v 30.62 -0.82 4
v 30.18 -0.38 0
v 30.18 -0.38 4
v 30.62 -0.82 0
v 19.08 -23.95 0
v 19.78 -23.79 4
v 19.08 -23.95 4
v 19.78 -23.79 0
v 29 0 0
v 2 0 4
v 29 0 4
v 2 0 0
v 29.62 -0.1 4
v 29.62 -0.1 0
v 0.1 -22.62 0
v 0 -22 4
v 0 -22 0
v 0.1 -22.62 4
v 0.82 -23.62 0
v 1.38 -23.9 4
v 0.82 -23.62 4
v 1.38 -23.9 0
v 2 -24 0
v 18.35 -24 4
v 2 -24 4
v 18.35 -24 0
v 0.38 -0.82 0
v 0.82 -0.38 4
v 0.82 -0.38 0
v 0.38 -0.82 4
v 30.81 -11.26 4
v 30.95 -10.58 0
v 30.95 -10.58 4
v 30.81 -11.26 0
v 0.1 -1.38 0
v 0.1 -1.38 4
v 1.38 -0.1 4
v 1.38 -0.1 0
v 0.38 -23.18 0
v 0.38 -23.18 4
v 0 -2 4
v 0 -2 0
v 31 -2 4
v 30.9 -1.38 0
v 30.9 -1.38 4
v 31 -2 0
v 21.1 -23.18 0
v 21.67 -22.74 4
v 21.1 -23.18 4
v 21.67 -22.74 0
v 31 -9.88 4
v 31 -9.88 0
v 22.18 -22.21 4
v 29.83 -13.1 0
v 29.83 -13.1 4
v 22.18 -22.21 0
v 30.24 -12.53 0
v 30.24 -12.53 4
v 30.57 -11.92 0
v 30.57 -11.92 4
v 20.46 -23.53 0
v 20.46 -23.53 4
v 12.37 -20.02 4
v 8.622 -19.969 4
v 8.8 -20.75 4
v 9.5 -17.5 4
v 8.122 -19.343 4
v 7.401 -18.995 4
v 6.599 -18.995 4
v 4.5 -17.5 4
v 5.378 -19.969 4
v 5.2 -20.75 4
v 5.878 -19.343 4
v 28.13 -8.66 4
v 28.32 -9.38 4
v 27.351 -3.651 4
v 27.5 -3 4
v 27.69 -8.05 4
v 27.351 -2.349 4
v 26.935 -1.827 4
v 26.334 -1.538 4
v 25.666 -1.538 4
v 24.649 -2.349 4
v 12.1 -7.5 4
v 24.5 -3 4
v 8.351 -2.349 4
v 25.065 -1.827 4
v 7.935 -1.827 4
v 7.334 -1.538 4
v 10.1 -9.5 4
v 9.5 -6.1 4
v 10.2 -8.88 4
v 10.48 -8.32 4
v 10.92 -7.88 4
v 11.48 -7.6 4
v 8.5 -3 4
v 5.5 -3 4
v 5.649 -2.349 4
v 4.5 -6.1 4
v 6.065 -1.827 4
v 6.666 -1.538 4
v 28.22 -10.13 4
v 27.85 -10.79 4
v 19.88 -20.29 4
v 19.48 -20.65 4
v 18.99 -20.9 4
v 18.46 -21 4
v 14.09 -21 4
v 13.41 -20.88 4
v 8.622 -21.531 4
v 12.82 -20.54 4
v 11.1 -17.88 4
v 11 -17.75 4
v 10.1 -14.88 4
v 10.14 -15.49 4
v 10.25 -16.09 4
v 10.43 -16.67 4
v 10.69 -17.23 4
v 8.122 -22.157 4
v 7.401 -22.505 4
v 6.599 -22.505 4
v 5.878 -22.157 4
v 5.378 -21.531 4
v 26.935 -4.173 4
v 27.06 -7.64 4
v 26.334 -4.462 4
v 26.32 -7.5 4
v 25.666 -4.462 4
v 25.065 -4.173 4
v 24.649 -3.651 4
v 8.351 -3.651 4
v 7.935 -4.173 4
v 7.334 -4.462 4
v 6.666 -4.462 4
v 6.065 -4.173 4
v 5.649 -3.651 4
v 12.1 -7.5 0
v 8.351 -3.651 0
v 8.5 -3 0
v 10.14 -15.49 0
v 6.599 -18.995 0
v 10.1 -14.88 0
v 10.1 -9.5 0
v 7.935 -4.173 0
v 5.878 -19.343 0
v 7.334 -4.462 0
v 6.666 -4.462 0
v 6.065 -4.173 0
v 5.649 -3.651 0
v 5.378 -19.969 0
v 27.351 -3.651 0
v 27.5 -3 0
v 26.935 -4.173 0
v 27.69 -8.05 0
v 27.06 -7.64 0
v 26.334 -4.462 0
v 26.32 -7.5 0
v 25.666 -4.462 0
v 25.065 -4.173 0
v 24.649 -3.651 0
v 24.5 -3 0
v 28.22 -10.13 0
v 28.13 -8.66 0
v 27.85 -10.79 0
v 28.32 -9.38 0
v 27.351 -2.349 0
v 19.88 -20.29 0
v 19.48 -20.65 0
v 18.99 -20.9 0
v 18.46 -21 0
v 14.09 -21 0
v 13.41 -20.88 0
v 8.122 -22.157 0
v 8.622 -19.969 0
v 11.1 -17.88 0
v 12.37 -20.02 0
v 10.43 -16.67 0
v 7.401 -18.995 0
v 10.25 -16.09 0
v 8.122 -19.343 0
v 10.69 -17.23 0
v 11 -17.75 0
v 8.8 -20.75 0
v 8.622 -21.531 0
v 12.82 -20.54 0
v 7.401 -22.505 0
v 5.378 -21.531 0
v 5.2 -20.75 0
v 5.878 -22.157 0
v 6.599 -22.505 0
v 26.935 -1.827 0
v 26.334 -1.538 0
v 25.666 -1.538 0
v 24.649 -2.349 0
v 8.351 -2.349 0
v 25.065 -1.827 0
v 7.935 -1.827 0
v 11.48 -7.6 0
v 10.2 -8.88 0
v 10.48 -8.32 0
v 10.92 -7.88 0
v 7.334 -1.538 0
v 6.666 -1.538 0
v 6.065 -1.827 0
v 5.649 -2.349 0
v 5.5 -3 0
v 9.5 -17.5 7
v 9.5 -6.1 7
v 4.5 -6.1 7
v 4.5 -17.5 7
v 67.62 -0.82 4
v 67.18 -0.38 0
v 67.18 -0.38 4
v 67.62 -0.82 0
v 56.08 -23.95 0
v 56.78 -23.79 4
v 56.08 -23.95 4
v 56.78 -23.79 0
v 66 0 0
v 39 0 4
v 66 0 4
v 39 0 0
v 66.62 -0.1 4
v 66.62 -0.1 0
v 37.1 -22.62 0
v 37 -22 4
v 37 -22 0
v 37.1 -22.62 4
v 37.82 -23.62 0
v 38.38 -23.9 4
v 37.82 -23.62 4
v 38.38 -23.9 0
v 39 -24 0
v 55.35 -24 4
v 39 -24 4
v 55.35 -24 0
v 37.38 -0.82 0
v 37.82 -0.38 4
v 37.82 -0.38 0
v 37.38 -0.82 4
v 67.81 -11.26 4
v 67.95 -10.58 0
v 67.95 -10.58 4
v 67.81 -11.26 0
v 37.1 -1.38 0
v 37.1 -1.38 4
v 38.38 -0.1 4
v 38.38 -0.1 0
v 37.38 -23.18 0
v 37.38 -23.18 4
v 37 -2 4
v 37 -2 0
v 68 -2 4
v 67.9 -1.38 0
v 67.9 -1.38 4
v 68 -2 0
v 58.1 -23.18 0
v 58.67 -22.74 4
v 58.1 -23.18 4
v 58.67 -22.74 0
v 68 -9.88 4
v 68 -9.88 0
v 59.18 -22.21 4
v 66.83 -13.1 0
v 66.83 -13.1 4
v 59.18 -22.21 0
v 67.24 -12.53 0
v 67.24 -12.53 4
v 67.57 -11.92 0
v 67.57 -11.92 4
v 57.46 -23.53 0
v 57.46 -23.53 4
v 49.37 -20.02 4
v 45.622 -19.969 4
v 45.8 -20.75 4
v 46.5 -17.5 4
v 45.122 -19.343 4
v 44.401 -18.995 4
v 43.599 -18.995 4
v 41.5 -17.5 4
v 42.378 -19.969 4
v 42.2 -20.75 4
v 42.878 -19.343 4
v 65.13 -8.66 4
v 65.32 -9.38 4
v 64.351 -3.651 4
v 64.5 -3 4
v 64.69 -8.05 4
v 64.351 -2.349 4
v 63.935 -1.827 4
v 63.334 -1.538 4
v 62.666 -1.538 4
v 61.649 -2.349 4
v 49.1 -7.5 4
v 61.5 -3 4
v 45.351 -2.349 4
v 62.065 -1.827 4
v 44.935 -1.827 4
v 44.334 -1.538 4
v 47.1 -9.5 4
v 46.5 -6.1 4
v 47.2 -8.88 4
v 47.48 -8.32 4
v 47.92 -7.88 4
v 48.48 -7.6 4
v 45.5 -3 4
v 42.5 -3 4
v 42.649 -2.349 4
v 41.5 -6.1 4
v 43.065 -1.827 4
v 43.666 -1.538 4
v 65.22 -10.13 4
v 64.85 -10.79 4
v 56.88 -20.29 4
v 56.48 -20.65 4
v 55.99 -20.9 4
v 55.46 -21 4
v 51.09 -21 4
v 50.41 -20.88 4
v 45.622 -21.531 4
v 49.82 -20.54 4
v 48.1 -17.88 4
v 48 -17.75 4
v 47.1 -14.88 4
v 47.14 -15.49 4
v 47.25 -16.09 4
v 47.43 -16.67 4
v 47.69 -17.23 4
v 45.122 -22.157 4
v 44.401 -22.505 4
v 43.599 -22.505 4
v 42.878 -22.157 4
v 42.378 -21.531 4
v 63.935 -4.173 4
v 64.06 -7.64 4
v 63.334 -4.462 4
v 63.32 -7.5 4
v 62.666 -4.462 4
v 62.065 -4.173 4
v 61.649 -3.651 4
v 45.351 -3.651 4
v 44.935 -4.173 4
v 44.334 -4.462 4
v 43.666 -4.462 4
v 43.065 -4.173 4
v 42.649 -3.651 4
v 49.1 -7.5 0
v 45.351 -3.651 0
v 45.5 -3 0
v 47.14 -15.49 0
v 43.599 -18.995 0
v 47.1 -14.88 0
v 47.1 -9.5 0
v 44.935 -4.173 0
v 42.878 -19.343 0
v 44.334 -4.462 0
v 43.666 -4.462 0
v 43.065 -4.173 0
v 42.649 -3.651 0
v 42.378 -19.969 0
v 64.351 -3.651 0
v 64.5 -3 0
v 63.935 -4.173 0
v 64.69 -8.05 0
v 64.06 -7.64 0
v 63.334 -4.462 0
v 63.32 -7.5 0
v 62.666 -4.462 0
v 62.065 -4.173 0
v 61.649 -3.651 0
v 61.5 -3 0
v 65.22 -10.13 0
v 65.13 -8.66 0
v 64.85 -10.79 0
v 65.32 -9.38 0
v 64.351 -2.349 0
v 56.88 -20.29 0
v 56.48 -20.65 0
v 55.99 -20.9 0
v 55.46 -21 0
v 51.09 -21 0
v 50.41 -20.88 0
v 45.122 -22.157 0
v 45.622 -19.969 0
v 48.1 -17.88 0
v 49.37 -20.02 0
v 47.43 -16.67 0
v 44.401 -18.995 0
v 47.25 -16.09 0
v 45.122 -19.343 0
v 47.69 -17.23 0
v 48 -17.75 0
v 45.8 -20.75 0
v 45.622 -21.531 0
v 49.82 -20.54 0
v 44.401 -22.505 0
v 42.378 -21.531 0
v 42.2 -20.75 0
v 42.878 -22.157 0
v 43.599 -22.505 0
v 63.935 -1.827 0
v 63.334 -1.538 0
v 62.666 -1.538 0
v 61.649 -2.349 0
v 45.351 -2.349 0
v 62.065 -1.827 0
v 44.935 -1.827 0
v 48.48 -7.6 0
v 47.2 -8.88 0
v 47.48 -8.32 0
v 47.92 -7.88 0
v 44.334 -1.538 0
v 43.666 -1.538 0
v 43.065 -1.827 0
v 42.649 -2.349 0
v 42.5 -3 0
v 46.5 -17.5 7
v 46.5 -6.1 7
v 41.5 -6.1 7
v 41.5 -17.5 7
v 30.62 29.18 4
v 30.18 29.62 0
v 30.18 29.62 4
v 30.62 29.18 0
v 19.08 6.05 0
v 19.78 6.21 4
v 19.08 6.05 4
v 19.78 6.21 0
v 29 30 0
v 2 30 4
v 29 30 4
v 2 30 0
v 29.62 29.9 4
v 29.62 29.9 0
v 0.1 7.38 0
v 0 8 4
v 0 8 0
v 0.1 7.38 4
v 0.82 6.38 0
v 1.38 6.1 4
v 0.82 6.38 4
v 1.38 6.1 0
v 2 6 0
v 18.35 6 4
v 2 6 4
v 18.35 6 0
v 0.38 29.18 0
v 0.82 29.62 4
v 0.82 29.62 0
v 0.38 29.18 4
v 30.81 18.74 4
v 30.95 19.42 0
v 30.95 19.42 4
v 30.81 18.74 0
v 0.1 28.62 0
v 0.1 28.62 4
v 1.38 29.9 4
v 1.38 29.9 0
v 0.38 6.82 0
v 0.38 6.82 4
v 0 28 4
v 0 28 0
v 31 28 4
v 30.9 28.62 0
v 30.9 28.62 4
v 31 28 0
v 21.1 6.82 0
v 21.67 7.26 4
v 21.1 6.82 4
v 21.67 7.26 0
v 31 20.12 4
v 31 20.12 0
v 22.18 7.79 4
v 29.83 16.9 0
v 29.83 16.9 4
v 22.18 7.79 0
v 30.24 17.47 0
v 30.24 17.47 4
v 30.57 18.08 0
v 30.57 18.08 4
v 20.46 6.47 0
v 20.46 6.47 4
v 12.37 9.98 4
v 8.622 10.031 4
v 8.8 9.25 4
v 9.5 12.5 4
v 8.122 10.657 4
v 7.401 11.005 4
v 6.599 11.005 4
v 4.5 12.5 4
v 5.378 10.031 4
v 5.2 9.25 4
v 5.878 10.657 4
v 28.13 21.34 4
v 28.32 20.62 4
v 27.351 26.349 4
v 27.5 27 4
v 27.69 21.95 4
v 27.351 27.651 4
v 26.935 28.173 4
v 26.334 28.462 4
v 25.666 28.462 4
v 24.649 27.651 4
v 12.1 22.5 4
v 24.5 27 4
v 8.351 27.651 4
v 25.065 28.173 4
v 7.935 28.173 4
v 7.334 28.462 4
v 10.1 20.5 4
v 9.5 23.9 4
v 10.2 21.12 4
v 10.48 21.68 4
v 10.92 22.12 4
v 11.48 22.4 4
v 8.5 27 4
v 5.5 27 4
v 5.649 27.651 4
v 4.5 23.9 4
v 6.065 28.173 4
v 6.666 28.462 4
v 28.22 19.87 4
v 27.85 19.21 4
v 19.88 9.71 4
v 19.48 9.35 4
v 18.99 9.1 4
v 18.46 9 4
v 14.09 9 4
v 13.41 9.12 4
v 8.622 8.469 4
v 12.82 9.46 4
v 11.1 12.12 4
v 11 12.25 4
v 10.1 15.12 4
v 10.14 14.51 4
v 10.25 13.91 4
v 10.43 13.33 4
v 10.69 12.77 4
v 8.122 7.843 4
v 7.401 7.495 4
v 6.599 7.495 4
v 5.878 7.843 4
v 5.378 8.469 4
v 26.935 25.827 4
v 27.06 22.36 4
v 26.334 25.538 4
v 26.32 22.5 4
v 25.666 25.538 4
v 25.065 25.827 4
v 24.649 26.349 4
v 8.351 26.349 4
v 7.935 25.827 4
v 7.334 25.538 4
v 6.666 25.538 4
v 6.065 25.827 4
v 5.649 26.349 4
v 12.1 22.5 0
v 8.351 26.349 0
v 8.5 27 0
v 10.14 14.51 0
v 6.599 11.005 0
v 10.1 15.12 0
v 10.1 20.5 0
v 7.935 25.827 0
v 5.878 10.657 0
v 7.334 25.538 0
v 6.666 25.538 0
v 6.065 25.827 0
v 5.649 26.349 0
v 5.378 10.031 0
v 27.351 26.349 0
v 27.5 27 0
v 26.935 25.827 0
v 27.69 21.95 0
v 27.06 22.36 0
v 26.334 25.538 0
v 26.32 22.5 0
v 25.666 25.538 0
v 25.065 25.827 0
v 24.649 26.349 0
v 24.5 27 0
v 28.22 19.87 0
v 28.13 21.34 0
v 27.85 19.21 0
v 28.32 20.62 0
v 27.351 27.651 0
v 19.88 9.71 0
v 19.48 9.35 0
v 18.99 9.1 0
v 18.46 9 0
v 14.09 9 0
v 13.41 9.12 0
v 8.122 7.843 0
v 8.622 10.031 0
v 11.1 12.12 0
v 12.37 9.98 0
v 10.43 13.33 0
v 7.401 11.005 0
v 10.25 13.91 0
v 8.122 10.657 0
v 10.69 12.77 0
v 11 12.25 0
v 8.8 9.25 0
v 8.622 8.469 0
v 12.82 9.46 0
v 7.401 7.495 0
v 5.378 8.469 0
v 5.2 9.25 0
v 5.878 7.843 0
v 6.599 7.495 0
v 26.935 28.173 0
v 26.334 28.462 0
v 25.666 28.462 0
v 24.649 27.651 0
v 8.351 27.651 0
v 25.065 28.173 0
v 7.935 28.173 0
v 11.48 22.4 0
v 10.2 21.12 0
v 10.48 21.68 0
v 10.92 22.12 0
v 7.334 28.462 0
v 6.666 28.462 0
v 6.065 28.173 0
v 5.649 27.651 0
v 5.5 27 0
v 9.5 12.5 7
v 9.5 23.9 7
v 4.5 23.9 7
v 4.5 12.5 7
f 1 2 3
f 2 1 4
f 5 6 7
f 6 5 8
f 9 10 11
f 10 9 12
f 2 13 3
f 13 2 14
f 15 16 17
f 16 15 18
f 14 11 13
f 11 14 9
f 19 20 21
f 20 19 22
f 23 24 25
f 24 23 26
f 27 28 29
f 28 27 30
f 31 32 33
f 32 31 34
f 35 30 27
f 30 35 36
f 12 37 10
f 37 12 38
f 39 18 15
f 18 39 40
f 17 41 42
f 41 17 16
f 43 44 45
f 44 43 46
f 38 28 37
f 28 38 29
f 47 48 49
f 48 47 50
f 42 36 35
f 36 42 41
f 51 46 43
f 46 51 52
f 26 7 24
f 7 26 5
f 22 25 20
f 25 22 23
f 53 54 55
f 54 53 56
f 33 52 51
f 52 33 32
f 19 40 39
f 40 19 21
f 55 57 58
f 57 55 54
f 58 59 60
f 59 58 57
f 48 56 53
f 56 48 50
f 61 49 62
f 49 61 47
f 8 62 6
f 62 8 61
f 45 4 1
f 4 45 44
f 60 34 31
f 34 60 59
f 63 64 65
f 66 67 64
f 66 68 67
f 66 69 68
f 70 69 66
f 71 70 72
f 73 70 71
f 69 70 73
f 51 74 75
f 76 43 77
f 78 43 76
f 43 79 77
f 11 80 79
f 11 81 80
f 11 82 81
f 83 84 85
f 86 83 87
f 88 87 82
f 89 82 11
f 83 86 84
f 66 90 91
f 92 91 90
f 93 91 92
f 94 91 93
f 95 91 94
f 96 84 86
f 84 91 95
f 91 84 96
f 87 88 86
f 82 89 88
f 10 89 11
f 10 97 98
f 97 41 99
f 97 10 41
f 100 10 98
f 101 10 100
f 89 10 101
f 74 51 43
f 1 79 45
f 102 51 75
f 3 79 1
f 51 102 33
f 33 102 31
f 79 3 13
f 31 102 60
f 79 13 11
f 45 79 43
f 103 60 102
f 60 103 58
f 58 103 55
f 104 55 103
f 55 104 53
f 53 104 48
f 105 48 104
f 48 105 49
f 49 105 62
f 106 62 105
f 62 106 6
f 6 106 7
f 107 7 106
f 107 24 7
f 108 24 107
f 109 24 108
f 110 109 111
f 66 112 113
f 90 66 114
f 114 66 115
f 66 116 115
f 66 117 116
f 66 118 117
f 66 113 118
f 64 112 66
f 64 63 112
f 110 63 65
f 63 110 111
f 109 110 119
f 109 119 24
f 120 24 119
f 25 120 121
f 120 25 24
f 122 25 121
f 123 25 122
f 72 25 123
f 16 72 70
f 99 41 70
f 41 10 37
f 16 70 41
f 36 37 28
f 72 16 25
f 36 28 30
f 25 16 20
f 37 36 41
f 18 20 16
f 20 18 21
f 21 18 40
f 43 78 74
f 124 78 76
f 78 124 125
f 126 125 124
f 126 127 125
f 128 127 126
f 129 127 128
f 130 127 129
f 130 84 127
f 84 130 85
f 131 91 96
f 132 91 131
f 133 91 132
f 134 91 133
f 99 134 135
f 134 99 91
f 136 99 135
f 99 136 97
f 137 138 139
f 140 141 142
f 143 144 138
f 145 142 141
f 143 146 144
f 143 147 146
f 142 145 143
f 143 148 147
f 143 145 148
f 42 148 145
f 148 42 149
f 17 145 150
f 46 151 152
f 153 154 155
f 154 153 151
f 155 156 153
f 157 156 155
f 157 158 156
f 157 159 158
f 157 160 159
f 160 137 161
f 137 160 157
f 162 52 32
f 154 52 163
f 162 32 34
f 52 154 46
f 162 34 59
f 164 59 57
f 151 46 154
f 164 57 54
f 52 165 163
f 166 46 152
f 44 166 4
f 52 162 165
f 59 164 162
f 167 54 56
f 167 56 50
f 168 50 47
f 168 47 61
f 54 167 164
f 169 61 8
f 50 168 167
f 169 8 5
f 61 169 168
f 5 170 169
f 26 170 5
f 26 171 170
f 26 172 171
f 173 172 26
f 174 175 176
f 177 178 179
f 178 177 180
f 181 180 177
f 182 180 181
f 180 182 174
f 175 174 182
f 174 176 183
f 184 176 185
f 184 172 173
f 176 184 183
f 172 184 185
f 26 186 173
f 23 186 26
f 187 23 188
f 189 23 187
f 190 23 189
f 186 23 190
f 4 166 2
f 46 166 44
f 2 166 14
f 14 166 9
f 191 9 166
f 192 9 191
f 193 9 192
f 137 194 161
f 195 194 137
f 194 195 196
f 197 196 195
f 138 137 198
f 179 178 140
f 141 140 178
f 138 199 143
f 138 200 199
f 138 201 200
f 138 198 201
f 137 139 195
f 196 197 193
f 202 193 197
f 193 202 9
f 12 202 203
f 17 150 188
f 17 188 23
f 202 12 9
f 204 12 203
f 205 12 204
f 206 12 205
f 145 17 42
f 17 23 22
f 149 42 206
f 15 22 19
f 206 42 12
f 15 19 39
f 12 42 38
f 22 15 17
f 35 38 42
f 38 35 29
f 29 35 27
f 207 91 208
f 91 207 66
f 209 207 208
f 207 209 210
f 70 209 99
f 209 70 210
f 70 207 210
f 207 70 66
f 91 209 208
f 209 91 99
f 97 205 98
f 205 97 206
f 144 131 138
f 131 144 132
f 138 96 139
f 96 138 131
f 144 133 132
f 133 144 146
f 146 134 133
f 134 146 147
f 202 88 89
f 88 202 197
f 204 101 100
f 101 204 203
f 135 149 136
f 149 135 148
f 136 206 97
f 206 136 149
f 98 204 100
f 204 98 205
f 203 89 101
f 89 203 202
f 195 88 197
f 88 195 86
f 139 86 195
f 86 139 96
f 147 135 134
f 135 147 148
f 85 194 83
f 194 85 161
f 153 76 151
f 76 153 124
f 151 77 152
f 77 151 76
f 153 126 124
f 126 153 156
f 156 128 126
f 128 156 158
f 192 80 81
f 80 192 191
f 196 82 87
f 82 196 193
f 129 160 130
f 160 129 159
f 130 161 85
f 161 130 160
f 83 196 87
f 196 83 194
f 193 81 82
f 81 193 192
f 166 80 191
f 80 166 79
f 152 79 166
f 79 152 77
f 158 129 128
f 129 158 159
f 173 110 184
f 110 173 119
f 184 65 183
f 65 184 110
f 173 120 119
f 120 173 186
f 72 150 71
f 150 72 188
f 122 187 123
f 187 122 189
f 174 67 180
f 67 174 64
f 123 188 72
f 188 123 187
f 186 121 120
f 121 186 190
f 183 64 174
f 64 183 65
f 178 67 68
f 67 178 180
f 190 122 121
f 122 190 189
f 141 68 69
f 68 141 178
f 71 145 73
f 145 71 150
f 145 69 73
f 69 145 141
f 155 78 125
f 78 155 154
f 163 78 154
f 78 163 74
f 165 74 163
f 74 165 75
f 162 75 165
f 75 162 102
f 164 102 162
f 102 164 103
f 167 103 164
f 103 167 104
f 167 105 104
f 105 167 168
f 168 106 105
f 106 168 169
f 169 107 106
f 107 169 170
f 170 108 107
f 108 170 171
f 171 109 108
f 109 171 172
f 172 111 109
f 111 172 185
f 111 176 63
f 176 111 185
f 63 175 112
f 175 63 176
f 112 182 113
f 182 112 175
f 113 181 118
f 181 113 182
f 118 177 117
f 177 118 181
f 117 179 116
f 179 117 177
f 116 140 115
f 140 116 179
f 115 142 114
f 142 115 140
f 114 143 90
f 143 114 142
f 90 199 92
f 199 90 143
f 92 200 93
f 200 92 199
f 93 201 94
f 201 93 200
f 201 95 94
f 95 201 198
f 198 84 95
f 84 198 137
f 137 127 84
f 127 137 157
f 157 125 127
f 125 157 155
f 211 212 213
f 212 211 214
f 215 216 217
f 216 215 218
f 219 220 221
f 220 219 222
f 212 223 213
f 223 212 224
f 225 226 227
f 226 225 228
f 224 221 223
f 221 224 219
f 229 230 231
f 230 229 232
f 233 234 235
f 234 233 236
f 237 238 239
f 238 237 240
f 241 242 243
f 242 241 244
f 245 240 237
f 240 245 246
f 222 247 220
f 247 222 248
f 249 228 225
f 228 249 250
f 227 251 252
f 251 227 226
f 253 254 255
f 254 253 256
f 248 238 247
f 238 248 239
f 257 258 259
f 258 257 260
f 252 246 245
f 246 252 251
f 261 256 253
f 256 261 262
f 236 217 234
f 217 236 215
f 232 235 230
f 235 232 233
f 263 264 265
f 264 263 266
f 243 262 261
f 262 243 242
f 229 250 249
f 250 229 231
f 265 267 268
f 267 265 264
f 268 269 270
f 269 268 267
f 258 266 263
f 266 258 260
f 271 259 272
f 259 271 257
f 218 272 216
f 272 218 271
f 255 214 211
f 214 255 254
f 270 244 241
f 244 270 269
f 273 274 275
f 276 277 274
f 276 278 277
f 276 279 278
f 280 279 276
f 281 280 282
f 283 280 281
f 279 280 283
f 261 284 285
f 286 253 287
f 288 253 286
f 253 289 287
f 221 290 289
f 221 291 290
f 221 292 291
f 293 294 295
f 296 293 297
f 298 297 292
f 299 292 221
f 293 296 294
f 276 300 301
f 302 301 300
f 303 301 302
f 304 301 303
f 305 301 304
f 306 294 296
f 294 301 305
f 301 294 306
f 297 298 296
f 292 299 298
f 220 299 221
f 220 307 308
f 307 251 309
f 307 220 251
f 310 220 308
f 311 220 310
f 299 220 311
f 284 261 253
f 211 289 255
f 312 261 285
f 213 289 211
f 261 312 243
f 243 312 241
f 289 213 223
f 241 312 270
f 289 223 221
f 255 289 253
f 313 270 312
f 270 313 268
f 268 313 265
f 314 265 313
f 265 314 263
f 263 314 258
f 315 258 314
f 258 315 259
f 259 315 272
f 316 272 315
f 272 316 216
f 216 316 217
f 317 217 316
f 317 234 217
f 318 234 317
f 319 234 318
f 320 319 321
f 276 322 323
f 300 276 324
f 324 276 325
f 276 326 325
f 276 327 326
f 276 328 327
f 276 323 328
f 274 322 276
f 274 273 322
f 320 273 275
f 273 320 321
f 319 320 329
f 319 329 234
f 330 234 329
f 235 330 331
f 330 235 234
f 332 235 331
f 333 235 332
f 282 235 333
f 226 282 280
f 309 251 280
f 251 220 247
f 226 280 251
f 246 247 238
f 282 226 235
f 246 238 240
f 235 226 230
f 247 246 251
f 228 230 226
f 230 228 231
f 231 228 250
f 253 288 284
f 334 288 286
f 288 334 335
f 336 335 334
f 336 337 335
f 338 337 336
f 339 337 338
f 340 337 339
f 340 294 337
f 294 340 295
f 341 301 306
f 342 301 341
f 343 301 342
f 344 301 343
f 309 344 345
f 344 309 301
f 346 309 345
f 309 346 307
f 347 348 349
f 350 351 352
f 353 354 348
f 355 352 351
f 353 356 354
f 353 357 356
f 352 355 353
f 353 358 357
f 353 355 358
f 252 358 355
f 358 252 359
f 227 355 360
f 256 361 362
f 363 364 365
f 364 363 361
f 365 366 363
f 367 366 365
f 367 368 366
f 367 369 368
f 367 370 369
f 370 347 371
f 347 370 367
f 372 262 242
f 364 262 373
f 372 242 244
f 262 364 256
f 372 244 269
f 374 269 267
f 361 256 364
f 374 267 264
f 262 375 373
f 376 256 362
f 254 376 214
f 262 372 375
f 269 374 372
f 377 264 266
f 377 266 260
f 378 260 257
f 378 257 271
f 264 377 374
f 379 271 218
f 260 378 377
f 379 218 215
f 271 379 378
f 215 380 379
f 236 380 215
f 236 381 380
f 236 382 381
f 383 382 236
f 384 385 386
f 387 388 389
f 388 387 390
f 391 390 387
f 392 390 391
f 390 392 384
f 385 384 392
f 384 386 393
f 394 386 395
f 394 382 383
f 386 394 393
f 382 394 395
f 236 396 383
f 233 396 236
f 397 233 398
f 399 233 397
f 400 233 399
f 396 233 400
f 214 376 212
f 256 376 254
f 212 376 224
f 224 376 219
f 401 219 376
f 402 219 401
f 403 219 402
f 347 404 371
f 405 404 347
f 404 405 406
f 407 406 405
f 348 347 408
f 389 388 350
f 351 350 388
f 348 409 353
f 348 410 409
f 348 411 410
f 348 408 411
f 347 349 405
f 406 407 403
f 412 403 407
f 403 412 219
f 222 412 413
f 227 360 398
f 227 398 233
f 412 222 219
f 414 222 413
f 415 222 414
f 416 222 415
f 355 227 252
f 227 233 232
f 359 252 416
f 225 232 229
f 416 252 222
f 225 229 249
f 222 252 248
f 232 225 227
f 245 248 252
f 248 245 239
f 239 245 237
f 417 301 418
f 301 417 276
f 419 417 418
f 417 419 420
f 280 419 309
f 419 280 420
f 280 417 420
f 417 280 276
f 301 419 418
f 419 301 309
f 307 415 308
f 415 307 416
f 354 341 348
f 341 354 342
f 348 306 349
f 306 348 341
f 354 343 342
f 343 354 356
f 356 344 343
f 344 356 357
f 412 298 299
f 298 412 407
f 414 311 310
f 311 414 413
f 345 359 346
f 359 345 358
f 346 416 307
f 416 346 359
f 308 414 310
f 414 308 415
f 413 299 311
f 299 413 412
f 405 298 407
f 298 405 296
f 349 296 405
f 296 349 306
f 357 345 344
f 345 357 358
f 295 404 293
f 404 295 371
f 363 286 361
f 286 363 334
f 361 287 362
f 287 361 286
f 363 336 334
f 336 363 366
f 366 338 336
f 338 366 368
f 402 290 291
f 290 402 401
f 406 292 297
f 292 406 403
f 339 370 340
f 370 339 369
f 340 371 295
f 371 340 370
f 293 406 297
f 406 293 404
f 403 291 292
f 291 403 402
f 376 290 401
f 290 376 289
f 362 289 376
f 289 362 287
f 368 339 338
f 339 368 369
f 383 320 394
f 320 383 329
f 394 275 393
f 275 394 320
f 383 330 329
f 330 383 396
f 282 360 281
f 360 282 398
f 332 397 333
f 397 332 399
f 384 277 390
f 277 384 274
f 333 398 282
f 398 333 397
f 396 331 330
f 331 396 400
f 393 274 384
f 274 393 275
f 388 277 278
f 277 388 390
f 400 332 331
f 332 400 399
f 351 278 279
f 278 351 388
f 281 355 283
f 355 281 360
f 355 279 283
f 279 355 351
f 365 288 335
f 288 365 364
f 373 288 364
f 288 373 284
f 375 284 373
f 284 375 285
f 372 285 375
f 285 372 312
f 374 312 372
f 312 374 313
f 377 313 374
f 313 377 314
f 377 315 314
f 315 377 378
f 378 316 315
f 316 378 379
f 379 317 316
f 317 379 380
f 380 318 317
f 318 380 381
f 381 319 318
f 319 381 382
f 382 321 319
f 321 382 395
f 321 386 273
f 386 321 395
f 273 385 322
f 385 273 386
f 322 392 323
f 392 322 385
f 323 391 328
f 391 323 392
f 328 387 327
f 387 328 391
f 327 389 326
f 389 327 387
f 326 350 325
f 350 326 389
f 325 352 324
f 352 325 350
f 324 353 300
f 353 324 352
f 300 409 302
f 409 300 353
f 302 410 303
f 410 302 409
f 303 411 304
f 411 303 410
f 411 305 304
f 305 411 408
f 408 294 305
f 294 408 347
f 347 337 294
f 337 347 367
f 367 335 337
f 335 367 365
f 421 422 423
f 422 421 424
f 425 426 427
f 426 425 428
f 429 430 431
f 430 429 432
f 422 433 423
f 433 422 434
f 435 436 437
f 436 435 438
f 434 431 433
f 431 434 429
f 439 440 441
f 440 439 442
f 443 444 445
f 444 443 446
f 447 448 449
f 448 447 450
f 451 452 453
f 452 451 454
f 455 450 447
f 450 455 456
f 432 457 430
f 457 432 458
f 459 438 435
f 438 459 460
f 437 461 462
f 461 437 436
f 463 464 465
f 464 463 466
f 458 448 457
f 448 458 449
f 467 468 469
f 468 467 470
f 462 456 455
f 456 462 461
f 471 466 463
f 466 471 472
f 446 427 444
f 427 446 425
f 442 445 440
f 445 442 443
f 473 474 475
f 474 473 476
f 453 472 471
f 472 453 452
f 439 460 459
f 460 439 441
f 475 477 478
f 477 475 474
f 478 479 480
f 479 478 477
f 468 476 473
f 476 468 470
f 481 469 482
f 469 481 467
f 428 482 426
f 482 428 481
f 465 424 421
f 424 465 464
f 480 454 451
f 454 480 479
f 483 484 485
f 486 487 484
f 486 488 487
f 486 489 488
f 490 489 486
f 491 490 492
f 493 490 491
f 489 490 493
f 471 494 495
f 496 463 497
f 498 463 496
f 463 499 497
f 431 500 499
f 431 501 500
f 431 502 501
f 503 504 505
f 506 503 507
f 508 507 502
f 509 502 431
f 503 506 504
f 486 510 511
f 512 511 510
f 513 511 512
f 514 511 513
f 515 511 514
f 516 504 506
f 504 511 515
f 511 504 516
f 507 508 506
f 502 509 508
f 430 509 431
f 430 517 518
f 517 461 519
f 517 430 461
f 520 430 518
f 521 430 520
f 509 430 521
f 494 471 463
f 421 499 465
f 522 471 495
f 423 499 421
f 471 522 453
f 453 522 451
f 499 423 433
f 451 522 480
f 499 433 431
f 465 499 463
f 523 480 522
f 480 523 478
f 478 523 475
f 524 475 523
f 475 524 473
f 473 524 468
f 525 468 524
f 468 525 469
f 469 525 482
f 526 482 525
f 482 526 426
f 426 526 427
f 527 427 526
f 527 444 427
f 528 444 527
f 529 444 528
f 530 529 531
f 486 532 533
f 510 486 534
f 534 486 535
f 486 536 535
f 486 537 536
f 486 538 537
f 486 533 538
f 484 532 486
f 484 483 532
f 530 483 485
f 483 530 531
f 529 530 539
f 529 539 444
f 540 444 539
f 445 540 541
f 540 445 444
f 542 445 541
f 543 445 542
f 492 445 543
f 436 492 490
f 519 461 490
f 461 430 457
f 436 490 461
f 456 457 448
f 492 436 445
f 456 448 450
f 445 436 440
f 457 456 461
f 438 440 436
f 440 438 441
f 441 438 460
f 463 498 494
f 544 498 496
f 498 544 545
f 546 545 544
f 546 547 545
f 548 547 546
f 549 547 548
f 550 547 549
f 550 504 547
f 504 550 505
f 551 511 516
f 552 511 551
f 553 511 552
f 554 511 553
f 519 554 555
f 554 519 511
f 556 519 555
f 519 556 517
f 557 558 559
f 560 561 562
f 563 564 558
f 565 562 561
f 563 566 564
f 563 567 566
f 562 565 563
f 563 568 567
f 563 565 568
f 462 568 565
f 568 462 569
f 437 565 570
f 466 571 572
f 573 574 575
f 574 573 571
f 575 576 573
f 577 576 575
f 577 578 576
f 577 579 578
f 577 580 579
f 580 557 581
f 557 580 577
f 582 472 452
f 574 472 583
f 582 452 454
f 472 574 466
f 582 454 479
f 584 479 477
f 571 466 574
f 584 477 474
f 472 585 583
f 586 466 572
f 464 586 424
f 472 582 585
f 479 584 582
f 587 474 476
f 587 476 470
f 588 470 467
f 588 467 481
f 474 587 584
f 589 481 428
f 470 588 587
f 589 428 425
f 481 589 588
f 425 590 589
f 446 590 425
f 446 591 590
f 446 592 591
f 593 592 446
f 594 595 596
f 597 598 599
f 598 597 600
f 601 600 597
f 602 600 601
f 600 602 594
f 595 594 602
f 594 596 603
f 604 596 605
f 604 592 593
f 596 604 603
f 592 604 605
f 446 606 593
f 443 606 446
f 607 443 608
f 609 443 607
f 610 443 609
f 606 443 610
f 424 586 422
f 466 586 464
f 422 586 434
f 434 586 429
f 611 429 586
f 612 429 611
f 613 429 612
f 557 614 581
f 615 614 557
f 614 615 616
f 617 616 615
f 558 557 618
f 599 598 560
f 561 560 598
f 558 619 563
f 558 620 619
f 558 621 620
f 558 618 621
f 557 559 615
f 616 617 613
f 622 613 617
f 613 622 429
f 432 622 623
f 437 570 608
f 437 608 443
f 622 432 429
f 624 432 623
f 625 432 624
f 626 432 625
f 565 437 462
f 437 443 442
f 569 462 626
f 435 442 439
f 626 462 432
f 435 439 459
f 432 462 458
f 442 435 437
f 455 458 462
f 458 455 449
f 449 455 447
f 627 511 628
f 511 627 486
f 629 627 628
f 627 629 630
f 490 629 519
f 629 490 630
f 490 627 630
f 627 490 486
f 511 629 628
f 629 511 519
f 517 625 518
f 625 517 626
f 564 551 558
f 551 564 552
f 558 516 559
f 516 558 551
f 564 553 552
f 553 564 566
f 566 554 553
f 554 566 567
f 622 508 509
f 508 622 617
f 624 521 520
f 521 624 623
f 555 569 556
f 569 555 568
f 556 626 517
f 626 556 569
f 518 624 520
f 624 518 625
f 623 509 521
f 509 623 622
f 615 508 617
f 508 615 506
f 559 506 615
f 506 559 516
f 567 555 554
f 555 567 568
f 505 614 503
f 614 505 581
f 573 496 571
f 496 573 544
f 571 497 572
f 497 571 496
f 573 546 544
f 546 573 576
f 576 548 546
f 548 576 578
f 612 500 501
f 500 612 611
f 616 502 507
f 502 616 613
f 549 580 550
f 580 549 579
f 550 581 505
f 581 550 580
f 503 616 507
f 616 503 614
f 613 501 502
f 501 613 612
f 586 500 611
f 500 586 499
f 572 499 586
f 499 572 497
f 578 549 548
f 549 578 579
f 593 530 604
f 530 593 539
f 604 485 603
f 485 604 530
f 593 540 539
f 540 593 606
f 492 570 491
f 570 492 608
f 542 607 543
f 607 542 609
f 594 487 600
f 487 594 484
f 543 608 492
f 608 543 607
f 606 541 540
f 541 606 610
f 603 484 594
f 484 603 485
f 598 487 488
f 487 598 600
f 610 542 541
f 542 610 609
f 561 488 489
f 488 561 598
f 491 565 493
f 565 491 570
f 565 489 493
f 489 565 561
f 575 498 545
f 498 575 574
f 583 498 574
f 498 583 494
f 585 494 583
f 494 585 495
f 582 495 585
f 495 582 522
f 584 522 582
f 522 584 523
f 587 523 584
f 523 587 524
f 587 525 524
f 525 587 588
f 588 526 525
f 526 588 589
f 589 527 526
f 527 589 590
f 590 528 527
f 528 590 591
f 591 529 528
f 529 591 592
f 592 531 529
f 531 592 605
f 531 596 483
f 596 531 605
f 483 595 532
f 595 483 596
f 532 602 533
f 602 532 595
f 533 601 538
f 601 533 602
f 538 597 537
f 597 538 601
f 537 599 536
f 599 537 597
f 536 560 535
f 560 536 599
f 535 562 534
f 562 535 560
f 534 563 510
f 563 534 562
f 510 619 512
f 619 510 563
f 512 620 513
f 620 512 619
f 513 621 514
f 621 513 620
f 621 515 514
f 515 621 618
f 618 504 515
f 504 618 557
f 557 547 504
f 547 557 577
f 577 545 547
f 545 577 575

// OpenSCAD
//FolgerTech Kossel Mini Endstop Bracket Modification
//7/8/2016      By: David Bunch
//
//From: http://www.thingiverse.com/thing:1540280
//Made it so I could change Dia. of Holes if Needed
//This is 11mm shorter than other design which should mean 11mm more height on Delta
//Changed inside cut to miss solder joints on limit switch board
//I did not have an M3x8mm bolt, so I used a M3x10mm bolt with a plastic spacer
//The M3x10mm bolt was going to far thru the T-Nut to work without the spacer
//M3x8mm bolt for T-Nut I think would work better
//I also added a little bump to fit in the extrusion to keep it in place with only 1 T-Nut
//
//I used 2x M2.5x10mm bolts & locknuts to hold switch on plastic
//1x M3x10mm bolt with plastic spacer with T-Nut (M3x8mm should work without spacer)
Ht = 4;             //Height of Base Profile
M2_5 = 3.0;         //M2.5 Bolt Diamter
M3 = 3.6;           //M3 Bolt Diameter
M2_5_Res = 14;      //Resolution of M2.5 Bolt Hole
M3_Res = 18;        //Resolution of M3 Bolt Hole
M3Nut = 6.9;        //OD to show M3, I am using M2.5, but this shows M3 should also work
module Tnut()
{
    color("silver",.5)
    translate([7,20.75,0])
    translate([-2.5,3,0-1.98])
    rotate([90,0,0])
    linear_extrude(height = 6, center = false, convexity = 10)polygon(points = 
    [[-1.07,-1.79],[6.11,-1.79],[8.01,0],[5,0],[5,1.98],
    [0,1.98],[0,0],[-2.9,0]]);
}
module Outline()
{
    union()
    {
        linear_extrude(height = Ht, center = false, convexity = 10)polygon(points = 
        [[0,22],[0,2],[0.1,1.38],[0.38,0.82],[0.82,0.38],
        [1.38,0.1],[2,0],[29,0],[29.62,0.1],[30.18,0.38],
        [30.62,0.82],[30.9,1.38],[31,2],[31,9.88],[30.95,10.58],
        [30.81,11.26],[30.57,11.92],[30.24,12.53],[29.83,13.1],[22.18,22.21],
        [21.67,22.74],[21.1,23.18],[20.46,23.53],[19.78,23.79],[19.08,23.95],
        [18.35,24],[2,24],[1.38,23.9],[0.82,23.62],[0.38,23.18],
        [0.1,22.62],[0,22]]);
        translate([4.5,6.1,-3])
        cube([5,11.4,3.1]);
    }
}
module Cut()
{
    translate([0,0,-1])
    linear_extrude(height = Ht+2, center = false, convexity = 10)polygon(points = 
    [[10.1,14.88],[10.14,15.49],[10.25,16.09],[10.43,16.67],[10.69,17.23],
    [11,17.75],[11.1,17.88],[12.37,20.02],[12.82,20.54],[13.41,20.88],
    [14.09,21],[18.46,21],[18.99,20.9],[19.48,20.65],[19.88,20.29],
    [27.85,10.79],[28.22,10.13],[28.32,9.38],[28.13,8.66],[27.69,8.05],
    [27.06,7.64],[26.32,7.5],[12.1,7.5],[11.48,7.6],[10.92,7.88],
    [10.48,8.32],[10.2,8.88],[10.1,9.5]]);
}
module Holes()
{
//Bottom Holes
    translate([7,3,-1])
    cylinder(d=M2_5,h=Ht+2,$fn=M2_5_Res);   //Limit Switch Hole at extrusion
    translate([26,3,-1])
    cylinder(d=M2_5,h=Ht+2,$fn=M2_5_Res);   //Limit Switch Hole at far end

    translate([7,20.75,-3.5])
    cylinder(d=M3,h=Ht*2,$fn=M2_5_Res);     //T-Nut M3 Hole

    translate([7,3,-2])
    %cylinder(d=M3Nut,h=2,$fn=6);       //show M3 nut for reference, I used M2.5
    %Tnut();                            //Show M3 T-Nut for reference
}
module DrawBracket()
{
    translate([0,0,4])
    rotate([180,0,0])               //Print so bump is on the top
    difference()
    {
        Outline();                  //Main profile of part
        Cut();                      //Main Cut
        Holes();                    //Drill the 3 holes
    }
}
DrawBracket();                      //1st Bracket
translate([37,0,0])
DrawBracket();                      //2nd Bracket
translate([0,30,0])
DrawBracket();                      //3rd Bracket
